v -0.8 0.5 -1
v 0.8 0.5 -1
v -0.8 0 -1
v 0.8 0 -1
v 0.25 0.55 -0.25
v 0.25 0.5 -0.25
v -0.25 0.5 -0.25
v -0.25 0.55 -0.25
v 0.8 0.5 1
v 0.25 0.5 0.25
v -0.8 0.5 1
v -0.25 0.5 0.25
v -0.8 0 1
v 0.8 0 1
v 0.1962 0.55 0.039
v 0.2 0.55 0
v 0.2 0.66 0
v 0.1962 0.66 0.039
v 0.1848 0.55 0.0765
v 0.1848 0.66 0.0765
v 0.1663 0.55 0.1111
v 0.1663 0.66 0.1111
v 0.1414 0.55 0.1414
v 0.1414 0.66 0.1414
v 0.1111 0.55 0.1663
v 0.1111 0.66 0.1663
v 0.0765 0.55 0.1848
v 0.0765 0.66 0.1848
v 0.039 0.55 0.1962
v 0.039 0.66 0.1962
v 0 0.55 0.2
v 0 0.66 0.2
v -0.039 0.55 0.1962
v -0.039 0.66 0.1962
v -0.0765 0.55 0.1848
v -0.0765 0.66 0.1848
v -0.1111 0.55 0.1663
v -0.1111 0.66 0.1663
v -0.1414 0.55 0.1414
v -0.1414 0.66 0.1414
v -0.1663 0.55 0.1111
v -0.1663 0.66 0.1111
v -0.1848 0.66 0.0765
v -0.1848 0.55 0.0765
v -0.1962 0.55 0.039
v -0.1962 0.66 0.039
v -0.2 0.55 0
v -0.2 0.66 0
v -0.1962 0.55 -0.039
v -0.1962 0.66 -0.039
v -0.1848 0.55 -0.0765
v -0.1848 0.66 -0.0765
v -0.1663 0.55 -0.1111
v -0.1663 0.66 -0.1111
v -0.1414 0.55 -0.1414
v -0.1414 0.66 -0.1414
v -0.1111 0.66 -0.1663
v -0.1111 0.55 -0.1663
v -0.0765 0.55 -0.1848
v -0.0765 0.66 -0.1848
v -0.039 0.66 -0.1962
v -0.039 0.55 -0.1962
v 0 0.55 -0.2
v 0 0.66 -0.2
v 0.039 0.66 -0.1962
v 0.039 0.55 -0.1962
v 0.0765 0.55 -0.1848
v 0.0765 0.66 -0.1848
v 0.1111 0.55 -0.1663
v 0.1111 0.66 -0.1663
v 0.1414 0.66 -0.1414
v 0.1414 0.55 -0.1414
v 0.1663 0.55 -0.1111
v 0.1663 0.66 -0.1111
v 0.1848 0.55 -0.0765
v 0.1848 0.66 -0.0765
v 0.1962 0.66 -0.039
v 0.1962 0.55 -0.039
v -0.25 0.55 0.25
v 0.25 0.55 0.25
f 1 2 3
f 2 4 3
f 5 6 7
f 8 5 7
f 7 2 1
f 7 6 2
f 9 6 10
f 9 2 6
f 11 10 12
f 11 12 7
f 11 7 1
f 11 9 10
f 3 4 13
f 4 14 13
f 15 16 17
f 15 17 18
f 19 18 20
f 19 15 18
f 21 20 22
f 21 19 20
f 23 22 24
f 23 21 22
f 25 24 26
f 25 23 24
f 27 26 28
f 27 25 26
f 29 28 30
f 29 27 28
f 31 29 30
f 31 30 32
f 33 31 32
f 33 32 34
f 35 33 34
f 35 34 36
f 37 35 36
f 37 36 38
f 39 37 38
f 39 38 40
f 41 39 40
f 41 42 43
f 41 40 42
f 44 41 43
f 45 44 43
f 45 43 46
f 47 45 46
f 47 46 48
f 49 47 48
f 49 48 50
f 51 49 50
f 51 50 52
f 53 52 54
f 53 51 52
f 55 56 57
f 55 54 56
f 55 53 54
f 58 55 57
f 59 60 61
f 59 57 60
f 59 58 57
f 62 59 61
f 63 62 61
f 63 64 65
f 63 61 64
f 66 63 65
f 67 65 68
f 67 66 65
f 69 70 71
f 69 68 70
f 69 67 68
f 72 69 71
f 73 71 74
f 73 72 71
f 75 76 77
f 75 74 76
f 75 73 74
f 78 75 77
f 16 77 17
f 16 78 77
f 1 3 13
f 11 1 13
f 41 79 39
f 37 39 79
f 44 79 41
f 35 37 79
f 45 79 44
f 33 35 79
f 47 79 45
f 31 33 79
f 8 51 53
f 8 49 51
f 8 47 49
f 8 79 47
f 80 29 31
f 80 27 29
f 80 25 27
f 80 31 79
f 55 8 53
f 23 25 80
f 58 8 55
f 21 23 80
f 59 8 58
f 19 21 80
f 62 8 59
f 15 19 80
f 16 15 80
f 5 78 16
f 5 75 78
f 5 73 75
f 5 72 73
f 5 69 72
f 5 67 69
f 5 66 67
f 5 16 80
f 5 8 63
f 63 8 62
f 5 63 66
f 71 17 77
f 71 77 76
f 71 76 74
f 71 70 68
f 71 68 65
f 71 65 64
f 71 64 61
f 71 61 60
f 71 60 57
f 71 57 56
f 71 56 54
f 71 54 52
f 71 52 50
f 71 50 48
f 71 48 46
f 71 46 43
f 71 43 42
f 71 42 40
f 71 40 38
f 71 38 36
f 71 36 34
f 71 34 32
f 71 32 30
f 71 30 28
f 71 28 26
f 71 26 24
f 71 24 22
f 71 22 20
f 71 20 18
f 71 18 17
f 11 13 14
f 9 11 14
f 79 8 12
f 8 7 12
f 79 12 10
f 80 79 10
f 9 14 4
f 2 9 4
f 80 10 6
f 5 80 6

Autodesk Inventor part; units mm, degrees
ref_plane "YZ Plane" through (0, 0, 0) normal (1, 0, 0) x (0, 1, 0)
ref_plane "XZ Plane" through (0, 0, 0) normal (0, 1, 0) x (-1, 0, 0)
ref_plane "XY Plane" through (0, 0, 0) normal (0, 0, 1) x (1, 0, 0)
sketch "Sketch1" plane through (0, 0, 0) normal (0, 1, 0) x (-1, 0, 0)
  line L0 (0.8, 1) -> (-0.8, 1)
  line L1 (-0.8, 1) -> (-0.8, -1)
  line L2 (-0.8, -1) -> (0.8, -1)
  line L3 (0.8, -1) -> (0.8, 1)
  line L4 (1.12, 0) -> (-1.12, 0) construction
  line L5 (0, -1.4) -> (0, 1.4) construction
  point P0 (0, 0)
  point P1 (0.8, 0)
  point P2 (0, 1)
  dimension "d0" = 1.6
  dimension "d1" = 2
extrude "Extrusion1" add sketch "Sketch1" along normal blind 0.5
sketch "Sketch2" plane through (0, 0.5, 0) normal (0, 1, 0) x (1, 0, 0)
  circle A0 centre (0, 0) radius 0.2
  line L0 (-0.25, -0.25) -> (0.25, -0.25)
  line L1 (0.25, -0.25) -> (0.25, 0.25)
  line L2 (0.25, 0.25) -> (-0.25, 0.25)
  line L3 (-0.25, 0.25) -> (-0.25, -0.25)
  line L4 (-1.12, 0) -> (1.12, 0) construction
  line L5 (0, 1.4) -> (0, -1.4) construction
  point P0 (-0.25, 0)
  point P1 (0, -0.25)
  dimension "d4" = 0.4
  dimension "d5" = 0.5
  dimension "d6" = 0.5
extrude "Extrusion2" add sketch "Sketch2" along normal blind 0.05
extrude "Extrusion3" add sketch "Sketch2" along normal blind 0.16 contours A0
properties part number "Force_sensor"
